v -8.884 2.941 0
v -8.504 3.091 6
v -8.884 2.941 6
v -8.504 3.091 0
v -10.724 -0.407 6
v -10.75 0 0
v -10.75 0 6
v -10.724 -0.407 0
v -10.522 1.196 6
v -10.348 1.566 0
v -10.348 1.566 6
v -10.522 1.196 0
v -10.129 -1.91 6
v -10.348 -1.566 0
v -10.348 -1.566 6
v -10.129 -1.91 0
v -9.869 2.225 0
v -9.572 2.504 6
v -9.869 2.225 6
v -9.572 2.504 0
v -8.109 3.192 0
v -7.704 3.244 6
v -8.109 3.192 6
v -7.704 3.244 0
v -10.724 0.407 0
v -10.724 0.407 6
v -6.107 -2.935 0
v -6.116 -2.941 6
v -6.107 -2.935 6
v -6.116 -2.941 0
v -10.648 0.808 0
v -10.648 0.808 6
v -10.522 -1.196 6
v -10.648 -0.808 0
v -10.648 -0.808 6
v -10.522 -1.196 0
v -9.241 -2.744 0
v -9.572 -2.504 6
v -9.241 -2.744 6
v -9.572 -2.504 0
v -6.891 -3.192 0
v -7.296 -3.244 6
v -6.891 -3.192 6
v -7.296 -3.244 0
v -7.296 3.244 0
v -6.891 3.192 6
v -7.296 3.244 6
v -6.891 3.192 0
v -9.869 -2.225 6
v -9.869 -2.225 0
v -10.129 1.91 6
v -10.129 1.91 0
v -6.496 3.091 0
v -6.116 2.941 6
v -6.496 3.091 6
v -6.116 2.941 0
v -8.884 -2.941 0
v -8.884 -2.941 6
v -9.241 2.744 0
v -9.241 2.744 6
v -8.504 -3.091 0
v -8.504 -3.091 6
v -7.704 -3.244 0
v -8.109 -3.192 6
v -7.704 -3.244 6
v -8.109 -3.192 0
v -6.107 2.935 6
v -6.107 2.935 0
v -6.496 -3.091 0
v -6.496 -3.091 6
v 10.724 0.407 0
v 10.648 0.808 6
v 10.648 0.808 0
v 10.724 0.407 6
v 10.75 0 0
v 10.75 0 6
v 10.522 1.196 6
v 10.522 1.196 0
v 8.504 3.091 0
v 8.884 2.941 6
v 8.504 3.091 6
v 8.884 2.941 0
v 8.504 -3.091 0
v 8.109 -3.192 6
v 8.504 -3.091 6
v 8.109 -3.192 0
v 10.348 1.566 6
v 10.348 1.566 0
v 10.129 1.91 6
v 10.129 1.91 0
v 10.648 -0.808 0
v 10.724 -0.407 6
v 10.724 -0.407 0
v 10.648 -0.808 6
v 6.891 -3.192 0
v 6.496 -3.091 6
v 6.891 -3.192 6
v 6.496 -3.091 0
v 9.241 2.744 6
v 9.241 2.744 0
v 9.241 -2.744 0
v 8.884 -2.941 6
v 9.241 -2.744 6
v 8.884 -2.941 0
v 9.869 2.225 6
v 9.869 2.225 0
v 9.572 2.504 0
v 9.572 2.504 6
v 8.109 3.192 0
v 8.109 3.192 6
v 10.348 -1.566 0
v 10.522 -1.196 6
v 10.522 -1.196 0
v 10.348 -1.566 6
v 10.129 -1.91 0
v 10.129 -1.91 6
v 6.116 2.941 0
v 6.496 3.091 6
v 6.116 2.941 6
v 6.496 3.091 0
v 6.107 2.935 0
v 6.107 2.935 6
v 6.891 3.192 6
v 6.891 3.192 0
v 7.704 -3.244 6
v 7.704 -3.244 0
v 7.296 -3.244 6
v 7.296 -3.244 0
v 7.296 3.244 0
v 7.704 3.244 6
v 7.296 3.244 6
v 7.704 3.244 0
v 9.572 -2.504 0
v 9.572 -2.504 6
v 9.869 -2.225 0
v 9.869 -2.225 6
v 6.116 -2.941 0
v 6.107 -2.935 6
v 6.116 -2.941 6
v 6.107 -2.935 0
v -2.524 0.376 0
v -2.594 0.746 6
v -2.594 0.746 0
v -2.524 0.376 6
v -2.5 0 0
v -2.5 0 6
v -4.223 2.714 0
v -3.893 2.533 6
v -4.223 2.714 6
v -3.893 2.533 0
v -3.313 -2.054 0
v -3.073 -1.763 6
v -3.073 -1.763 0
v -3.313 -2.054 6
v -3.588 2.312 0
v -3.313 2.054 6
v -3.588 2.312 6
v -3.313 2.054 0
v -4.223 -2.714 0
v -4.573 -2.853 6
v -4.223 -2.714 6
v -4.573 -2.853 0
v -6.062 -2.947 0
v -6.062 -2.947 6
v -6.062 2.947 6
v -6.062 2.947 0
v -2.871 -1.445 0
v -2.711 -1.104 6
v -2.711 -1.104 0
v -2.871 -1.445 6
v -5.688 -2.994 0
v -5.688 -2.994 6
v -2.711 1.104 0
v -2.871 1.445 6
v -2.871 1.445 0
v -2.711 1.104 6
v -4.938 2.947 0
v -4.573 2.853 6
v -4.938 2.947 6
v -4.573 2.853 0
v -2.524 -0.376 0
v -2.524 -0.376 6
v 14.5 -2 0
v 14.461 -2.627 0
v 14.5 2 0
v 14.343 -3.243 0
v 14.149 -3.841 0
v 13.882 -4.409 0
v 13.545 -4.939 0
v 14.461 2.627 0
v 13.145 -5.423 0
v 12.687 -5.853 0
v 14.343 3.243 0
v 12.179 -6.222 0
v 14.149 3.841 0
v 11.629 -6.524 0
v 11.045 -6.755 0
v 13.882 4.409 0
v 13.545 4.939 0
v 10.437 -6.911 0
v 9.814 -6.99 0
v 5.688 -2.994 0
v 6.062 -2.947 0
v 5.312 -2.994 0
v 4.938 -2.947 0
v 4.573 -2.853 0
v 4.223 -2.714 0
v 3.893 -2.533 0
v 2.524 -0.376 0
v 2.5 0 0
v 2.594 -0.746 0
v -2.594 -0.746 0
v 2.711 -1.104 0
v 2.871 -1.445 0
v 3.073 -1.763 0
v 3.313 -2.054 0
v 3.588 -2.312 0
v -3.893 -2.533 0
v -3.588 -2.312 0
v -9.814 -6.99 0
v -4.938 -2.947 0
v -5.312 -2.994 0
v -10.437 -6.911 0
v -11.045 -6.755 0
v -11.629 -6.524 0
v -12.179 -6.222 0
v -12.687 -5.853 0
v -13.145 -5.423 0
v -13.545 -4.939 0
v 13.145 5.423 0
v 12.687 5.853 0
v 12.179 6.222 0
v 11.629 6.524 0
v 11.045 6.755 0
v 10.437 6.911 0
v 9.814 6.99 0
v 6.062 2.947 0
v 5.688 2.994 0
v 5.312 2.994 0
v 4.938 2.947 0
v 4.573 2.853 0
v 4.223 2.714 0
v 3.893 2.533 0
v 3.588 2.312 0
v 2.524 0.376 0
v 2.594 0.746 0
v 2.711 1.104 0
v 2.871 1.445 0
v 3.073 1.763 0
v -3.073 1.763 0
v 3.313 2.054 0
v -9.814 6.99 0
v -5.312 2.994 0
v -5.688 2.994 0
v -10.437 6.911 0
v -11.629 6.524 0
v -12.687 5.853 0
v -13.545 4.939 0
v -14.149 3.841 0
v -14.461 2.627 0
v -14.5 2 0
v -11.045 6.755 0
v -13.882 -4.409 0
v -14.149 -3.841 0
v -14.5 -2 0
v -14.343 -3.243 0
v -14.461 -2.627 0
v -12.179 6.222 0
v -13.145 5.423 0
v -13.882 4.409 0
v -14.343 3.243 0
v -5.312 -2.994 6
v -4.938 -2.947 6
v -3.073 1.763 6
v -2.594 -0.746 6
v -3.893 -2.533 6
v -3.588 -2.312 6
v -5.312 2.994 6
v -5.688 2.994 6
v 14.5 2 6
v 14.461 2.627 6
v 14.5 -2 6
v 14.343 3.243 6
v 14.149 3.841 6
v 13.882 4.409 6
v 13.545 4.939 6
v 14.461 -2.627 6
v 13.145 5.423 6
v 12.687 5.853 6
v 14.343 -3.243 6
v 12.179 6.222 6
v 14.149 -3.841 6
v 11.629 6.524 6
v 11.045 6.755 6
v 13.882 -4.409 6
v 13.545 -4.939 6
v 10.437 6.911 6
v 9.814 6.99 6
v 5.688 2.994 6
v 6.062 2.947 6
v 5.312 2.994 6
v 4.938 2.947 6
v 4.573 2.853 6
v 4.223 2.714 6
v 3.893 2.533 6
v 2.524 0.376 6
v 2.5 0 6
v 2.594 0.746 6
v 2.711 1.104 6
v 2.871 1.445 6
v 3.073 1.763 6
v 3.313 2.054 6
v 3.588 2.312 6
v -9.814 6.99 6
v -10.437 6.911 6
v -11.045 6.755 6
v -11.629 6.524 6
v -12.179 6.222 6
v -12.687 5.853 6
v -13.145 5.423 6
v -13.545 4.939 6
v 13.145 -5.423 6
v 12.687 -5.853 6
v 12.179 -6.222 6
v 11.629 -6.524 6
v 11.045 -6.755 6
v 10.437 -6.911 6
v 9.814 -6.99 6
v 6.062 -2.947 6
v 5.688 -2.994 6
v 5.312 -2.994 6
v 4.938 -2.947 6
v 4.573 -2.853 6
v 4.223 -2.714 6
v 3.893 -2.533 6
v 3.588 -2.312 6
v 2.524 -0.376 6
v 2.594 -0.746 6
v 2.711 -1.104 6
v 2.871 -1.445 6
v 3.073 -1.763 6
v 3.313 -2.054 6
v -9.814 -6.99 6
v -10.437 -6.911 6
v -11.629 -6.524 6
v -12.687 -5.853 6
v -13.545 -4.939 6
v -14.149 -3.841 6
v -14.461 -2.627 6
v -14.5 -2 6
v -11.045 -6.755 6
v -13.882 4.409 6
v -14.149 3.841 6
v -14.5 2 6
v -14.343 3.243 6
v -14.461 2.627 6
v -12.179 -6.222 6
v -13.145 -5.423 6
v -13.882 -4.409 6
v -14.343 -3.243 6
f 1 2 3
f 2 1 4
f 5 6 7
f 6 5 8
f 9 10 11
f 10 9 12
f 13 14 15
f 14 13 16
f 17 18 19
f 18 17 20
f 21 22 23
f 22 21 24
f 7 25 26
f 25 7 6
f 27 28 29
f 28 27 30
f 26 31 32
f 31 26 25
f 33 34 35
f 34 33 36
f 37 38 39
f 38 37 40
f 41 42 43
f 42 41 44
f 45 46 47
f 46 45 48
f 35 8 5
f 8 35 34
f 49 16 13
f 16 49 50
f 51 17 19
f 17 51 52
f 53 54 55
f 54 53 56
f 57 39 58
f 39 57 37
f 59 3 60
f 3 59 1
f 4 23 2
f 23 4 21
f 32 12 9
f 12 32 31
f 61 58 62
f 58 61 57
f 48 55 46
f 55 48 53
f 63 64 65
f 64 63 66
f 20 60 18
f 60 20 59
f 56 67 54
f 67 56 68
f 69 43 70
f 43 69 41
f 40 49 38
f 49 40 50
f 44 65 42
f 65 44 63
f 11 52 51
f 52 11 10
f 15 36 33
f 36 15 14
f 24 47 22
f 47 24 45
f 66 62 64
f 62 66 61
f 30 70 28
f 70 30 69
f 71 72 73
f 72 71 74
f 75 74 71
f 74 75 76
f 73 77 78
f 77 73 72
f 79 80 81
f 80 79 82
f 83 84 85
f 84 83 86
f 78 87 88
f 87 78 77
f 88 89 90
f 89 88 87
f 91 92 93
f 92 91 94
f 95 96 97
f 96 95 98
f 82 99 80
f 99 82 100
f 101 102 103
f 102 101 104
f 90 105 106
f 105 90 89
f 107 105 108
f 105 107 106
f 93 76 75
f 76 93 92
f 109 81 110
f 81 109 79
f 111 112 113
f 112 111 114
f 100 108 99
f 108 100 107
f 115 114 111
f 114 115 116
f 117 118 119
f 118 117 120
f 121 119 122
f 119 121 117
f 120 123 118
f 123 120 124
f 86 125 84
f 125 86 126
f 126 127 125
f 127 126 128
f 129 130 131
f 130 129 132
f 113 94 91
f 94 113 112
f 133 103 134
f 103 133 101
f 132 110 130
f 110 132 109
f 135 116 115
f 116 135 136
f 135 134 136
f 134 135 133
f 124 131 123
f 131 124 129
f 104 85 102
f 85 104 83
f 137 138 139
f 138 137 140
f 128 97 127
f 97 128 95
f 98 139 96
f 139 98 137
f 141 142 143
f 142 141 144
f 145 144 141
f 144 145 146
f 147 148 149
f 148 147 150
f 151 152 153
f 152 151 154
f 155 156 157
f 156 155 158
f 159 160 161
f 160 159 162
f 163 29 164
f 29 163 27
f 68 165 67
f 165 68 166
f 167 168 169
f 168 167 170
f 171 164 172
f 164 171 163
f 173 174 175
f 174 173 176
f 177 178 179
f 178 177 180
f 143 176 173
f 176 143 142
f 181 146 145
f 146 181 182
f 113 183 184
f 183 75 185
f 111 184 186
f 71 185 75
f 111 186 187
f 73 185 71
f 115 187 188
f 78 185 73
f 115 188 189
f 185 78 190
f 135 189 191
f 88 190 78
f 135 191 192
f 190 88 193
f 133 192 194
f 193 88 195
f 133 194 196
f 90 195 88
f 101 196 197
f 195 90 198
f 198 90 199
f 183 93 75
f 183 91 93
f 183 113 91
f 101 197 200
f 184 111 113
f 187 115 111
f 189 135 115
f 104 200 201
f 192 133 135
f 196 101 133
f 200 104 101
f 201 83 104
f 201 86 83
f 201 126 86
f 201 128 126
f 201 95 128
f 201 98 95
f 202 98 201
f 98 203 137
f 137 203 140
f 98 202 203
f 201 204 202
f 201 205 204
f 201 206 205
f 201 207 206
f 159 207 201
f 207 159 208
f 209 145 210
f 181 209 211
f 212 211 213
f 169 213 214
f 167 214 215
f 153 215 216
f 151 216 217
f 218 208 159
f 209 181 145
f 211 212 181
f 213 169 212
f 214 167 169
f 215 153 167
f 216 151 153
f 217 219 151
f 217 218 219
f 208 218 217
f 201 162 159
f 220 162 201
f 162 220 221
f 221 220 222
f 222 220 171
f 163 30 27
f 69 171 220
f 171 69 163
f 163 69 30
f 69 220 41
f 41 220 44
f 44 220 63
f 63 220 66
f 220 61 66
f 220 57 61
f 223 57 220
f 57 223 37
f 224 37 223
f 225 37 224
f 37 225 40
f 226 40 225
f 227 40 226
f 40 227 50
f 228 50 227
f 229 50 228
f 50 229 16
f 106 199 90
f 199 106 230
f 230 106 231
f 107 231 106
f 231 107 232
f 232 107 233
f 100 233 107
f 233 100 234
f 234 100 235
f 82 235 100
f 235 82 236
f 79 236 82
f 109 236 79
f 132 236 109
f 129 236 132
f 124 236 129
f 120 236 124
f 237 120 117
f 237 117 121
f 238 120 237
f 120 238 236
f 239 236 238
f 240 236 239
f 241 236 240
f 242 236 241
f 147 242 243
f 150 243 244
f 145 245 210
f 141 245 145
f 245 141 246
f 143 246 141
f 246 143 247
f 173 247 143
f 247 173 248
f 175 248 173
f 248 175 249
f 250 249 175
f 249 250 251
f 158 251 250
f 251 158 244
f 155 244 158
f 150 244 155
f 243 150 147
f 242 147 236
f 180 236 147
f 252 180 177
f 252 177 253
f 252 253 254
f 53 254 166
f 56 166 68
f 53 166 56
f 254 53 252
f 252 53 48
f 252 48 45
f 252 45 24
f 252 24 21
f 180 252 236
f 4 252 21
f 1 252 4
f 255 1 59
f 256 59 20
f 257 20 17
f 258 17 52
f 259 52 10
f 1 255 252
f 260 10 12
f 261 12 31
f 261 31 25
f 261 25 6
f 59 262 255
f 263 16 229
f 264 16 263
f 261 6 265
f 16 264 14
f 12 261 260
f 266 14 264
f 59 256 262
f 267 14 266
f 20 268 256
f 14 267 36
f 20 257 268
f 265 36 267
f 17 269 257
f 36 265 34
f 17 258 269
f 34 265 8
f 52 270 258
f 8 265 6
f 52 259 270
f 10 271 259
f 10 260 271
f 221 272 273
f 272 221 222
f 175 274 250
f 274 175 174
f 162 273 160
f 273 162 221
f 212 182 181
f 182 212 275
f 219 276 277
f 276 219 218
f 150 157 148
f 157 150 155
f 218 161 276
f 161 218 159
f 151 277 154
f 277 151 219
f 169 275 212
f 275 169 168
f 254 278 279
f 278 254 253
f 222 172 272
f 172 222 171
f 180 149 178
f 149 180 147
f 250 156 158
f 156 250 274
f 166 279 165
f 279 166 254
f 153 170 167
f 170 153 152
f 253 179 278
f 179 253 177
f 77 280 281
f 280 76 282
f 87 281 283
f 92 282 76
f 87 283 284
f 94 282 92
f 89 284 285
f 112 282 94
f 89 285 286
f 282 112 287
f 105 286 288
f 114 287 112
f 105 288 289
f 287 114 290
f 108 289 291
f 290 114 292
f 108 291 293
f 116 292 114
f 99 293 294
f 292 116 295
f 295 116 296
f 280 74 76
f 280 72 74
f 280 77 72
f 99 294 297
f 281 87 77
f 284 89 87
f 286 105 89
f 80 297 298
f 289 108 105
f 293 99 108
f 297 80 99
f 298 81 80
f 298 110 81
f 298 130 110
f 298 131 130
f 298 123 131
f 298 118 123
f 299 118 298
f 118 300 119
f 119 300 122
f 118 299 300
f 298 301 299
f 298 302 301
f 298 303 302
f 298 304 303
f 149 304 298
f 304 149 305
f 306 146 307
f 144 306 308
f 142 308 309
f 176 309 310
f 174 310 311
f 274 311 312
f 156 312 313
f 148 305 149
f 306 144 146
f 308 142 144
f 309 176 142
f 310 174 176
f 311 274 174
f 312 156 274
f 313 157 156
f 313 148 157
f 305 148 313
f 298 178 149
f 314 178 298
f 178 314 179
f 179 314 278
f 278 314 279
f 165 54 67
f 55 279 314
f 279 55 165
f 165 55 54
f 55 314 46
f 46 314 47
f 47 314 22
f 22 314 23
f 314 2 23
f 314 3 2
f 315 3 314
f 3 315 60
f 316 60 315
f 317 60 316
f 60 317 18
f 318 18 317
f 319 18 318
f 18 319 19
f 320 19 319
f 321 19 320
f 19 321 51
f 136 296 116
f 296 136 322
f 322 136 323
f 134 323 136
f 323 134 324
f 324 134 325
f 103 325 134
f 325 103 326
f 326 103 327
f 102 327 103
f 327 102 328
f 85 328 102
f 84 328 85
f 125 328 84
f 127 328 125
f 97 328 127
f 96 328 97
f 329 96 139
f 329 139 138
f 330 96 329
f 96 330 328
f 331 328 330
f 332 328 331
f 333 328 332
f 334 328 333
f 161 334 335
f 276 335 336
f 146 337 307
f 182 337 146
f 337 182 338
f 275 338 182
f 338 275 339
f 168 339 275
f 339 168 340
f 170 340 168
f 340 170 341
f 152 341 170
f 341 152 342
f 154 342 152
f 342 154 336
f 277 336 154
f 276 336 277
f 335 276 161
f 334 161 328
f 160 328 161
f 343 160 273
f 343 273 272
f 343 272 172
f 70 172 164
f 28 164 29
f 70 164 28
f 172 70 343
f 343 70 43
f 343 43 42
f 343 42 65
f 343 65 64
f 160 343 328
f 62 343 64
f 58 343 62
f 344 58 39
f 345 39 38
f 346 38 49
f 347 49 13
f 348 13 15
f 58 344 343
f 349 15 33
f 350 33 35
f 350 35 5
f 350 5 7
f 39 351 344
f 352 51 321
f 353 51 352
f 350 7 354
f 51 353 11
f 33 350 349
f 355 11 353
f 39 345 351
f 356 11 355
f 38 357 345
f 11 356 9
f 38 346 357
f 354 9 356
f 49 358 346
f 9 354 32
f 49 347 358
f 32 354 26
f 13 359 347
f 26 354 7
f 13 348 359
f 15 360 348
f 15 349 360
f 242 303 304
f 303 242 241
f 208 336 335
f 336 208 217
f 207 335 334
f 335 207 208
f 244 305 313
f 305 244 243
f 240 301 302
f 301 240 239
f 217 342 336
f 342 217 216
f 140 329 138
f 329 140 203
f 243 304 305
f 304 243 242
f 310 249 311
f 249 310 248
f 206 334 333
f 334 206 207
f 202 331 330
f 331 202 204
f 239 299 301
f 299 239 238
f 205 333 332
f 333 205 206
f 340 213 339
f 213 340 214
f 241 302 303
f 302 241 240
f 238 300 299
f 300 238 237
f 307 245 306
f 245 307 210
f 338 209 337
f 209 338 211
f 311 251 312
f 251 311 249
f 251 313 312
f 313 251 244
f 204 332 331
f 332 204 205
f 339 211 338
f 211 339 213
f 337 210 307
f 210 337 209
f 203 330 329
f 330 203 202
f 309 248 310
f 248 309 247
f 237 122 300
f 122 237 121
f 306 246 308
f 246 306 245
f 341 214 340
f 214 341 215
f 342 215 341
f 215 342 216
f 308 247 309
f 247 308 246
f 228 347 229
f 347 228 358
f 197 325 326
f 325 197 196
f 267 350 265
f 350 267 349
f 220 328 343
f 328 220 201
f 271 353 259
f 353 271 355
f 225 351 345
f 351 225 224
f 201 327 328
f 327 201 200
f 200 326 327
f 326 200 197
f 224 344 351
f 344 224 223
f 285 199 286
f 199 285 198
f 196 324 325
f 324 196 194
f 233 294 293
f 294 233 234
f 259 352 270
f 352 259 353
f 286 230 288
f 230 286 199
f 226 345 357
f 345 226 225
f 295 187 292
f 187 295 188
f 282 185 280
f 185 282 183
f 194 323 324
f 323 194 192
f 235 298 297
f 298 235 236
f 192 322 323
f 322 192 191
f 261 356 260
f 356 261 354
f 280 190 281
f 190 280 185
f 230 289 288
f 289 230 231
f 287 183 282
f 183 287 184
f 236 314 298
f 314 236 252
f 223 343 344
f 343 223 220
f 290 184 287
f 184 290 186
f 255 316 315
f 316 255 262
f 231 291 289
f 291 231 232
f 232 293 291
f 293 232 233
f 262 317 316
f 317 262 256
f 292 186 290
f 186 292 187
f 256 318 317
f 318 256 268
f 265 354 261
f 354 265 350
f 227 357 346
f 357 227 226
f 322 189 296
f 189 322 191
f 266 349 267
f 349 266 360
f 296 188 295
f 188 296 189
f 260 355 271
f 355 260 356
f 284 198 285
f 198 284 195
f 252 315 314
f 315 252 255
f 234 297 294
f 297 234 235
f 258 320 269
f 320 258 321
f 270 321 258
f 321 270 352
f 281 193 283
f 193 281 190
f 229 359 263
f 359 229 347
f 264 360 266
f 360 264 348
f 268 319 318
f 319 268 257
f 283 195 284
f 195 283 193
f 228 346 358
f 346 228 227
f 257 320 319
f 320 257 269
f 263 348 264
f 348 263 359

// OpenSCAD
$fn = 50;


difference() {
	union() {
		hull() {
			translate(v = [-9.5000000000, 2.0000000000, 0]) {
				cylinder(h = 6, r = 5);
			}
			translate(v = [9.5000000000, 2.0000000000, 0]) {
				cylinder(h = 6, r = 5);
			}
			translate(v = [-9.5000000000, -2.0000000000, 0]) {
				cylinder(h = 6, r = 5);
			}
			translate(v = [9.5000000000, -2.0000000000, 0]) {
				cylinder(h = 6, r = 5);
			}
		}
	}
	union() {
		#translate(v = [-7.5000000000, 0.0000000000, -100.0000000000]) {
			cylinder(h = 200, r = 3.2500000000);
		}
		#translate(v = [-7.5000000000, 0.0000000000, -100.0000000000]) {
			cylinder(h = 200, r = 3.2500000000);
		}
		#translate(v = [7.5000000000, 0.0000000000, -100.0000000000]) {
			cylinder(h = 200, r = 3.2500000000);
		}
		#translate(v = [7.5000000000, 0.0000000000, -100.0000000000]) {
			cylinder(h = 200, r = 3.2500000000);
		}
		#translate(v = [-5.5000000000, 0, 0]) {
			cylinder(h = 6, r = 3.0000000000);
		}
		#translate(v = [5.5000000000, 0, 0]) {
			cylinder(h = 6, r = 3.0000000000);
		}
	}
}
